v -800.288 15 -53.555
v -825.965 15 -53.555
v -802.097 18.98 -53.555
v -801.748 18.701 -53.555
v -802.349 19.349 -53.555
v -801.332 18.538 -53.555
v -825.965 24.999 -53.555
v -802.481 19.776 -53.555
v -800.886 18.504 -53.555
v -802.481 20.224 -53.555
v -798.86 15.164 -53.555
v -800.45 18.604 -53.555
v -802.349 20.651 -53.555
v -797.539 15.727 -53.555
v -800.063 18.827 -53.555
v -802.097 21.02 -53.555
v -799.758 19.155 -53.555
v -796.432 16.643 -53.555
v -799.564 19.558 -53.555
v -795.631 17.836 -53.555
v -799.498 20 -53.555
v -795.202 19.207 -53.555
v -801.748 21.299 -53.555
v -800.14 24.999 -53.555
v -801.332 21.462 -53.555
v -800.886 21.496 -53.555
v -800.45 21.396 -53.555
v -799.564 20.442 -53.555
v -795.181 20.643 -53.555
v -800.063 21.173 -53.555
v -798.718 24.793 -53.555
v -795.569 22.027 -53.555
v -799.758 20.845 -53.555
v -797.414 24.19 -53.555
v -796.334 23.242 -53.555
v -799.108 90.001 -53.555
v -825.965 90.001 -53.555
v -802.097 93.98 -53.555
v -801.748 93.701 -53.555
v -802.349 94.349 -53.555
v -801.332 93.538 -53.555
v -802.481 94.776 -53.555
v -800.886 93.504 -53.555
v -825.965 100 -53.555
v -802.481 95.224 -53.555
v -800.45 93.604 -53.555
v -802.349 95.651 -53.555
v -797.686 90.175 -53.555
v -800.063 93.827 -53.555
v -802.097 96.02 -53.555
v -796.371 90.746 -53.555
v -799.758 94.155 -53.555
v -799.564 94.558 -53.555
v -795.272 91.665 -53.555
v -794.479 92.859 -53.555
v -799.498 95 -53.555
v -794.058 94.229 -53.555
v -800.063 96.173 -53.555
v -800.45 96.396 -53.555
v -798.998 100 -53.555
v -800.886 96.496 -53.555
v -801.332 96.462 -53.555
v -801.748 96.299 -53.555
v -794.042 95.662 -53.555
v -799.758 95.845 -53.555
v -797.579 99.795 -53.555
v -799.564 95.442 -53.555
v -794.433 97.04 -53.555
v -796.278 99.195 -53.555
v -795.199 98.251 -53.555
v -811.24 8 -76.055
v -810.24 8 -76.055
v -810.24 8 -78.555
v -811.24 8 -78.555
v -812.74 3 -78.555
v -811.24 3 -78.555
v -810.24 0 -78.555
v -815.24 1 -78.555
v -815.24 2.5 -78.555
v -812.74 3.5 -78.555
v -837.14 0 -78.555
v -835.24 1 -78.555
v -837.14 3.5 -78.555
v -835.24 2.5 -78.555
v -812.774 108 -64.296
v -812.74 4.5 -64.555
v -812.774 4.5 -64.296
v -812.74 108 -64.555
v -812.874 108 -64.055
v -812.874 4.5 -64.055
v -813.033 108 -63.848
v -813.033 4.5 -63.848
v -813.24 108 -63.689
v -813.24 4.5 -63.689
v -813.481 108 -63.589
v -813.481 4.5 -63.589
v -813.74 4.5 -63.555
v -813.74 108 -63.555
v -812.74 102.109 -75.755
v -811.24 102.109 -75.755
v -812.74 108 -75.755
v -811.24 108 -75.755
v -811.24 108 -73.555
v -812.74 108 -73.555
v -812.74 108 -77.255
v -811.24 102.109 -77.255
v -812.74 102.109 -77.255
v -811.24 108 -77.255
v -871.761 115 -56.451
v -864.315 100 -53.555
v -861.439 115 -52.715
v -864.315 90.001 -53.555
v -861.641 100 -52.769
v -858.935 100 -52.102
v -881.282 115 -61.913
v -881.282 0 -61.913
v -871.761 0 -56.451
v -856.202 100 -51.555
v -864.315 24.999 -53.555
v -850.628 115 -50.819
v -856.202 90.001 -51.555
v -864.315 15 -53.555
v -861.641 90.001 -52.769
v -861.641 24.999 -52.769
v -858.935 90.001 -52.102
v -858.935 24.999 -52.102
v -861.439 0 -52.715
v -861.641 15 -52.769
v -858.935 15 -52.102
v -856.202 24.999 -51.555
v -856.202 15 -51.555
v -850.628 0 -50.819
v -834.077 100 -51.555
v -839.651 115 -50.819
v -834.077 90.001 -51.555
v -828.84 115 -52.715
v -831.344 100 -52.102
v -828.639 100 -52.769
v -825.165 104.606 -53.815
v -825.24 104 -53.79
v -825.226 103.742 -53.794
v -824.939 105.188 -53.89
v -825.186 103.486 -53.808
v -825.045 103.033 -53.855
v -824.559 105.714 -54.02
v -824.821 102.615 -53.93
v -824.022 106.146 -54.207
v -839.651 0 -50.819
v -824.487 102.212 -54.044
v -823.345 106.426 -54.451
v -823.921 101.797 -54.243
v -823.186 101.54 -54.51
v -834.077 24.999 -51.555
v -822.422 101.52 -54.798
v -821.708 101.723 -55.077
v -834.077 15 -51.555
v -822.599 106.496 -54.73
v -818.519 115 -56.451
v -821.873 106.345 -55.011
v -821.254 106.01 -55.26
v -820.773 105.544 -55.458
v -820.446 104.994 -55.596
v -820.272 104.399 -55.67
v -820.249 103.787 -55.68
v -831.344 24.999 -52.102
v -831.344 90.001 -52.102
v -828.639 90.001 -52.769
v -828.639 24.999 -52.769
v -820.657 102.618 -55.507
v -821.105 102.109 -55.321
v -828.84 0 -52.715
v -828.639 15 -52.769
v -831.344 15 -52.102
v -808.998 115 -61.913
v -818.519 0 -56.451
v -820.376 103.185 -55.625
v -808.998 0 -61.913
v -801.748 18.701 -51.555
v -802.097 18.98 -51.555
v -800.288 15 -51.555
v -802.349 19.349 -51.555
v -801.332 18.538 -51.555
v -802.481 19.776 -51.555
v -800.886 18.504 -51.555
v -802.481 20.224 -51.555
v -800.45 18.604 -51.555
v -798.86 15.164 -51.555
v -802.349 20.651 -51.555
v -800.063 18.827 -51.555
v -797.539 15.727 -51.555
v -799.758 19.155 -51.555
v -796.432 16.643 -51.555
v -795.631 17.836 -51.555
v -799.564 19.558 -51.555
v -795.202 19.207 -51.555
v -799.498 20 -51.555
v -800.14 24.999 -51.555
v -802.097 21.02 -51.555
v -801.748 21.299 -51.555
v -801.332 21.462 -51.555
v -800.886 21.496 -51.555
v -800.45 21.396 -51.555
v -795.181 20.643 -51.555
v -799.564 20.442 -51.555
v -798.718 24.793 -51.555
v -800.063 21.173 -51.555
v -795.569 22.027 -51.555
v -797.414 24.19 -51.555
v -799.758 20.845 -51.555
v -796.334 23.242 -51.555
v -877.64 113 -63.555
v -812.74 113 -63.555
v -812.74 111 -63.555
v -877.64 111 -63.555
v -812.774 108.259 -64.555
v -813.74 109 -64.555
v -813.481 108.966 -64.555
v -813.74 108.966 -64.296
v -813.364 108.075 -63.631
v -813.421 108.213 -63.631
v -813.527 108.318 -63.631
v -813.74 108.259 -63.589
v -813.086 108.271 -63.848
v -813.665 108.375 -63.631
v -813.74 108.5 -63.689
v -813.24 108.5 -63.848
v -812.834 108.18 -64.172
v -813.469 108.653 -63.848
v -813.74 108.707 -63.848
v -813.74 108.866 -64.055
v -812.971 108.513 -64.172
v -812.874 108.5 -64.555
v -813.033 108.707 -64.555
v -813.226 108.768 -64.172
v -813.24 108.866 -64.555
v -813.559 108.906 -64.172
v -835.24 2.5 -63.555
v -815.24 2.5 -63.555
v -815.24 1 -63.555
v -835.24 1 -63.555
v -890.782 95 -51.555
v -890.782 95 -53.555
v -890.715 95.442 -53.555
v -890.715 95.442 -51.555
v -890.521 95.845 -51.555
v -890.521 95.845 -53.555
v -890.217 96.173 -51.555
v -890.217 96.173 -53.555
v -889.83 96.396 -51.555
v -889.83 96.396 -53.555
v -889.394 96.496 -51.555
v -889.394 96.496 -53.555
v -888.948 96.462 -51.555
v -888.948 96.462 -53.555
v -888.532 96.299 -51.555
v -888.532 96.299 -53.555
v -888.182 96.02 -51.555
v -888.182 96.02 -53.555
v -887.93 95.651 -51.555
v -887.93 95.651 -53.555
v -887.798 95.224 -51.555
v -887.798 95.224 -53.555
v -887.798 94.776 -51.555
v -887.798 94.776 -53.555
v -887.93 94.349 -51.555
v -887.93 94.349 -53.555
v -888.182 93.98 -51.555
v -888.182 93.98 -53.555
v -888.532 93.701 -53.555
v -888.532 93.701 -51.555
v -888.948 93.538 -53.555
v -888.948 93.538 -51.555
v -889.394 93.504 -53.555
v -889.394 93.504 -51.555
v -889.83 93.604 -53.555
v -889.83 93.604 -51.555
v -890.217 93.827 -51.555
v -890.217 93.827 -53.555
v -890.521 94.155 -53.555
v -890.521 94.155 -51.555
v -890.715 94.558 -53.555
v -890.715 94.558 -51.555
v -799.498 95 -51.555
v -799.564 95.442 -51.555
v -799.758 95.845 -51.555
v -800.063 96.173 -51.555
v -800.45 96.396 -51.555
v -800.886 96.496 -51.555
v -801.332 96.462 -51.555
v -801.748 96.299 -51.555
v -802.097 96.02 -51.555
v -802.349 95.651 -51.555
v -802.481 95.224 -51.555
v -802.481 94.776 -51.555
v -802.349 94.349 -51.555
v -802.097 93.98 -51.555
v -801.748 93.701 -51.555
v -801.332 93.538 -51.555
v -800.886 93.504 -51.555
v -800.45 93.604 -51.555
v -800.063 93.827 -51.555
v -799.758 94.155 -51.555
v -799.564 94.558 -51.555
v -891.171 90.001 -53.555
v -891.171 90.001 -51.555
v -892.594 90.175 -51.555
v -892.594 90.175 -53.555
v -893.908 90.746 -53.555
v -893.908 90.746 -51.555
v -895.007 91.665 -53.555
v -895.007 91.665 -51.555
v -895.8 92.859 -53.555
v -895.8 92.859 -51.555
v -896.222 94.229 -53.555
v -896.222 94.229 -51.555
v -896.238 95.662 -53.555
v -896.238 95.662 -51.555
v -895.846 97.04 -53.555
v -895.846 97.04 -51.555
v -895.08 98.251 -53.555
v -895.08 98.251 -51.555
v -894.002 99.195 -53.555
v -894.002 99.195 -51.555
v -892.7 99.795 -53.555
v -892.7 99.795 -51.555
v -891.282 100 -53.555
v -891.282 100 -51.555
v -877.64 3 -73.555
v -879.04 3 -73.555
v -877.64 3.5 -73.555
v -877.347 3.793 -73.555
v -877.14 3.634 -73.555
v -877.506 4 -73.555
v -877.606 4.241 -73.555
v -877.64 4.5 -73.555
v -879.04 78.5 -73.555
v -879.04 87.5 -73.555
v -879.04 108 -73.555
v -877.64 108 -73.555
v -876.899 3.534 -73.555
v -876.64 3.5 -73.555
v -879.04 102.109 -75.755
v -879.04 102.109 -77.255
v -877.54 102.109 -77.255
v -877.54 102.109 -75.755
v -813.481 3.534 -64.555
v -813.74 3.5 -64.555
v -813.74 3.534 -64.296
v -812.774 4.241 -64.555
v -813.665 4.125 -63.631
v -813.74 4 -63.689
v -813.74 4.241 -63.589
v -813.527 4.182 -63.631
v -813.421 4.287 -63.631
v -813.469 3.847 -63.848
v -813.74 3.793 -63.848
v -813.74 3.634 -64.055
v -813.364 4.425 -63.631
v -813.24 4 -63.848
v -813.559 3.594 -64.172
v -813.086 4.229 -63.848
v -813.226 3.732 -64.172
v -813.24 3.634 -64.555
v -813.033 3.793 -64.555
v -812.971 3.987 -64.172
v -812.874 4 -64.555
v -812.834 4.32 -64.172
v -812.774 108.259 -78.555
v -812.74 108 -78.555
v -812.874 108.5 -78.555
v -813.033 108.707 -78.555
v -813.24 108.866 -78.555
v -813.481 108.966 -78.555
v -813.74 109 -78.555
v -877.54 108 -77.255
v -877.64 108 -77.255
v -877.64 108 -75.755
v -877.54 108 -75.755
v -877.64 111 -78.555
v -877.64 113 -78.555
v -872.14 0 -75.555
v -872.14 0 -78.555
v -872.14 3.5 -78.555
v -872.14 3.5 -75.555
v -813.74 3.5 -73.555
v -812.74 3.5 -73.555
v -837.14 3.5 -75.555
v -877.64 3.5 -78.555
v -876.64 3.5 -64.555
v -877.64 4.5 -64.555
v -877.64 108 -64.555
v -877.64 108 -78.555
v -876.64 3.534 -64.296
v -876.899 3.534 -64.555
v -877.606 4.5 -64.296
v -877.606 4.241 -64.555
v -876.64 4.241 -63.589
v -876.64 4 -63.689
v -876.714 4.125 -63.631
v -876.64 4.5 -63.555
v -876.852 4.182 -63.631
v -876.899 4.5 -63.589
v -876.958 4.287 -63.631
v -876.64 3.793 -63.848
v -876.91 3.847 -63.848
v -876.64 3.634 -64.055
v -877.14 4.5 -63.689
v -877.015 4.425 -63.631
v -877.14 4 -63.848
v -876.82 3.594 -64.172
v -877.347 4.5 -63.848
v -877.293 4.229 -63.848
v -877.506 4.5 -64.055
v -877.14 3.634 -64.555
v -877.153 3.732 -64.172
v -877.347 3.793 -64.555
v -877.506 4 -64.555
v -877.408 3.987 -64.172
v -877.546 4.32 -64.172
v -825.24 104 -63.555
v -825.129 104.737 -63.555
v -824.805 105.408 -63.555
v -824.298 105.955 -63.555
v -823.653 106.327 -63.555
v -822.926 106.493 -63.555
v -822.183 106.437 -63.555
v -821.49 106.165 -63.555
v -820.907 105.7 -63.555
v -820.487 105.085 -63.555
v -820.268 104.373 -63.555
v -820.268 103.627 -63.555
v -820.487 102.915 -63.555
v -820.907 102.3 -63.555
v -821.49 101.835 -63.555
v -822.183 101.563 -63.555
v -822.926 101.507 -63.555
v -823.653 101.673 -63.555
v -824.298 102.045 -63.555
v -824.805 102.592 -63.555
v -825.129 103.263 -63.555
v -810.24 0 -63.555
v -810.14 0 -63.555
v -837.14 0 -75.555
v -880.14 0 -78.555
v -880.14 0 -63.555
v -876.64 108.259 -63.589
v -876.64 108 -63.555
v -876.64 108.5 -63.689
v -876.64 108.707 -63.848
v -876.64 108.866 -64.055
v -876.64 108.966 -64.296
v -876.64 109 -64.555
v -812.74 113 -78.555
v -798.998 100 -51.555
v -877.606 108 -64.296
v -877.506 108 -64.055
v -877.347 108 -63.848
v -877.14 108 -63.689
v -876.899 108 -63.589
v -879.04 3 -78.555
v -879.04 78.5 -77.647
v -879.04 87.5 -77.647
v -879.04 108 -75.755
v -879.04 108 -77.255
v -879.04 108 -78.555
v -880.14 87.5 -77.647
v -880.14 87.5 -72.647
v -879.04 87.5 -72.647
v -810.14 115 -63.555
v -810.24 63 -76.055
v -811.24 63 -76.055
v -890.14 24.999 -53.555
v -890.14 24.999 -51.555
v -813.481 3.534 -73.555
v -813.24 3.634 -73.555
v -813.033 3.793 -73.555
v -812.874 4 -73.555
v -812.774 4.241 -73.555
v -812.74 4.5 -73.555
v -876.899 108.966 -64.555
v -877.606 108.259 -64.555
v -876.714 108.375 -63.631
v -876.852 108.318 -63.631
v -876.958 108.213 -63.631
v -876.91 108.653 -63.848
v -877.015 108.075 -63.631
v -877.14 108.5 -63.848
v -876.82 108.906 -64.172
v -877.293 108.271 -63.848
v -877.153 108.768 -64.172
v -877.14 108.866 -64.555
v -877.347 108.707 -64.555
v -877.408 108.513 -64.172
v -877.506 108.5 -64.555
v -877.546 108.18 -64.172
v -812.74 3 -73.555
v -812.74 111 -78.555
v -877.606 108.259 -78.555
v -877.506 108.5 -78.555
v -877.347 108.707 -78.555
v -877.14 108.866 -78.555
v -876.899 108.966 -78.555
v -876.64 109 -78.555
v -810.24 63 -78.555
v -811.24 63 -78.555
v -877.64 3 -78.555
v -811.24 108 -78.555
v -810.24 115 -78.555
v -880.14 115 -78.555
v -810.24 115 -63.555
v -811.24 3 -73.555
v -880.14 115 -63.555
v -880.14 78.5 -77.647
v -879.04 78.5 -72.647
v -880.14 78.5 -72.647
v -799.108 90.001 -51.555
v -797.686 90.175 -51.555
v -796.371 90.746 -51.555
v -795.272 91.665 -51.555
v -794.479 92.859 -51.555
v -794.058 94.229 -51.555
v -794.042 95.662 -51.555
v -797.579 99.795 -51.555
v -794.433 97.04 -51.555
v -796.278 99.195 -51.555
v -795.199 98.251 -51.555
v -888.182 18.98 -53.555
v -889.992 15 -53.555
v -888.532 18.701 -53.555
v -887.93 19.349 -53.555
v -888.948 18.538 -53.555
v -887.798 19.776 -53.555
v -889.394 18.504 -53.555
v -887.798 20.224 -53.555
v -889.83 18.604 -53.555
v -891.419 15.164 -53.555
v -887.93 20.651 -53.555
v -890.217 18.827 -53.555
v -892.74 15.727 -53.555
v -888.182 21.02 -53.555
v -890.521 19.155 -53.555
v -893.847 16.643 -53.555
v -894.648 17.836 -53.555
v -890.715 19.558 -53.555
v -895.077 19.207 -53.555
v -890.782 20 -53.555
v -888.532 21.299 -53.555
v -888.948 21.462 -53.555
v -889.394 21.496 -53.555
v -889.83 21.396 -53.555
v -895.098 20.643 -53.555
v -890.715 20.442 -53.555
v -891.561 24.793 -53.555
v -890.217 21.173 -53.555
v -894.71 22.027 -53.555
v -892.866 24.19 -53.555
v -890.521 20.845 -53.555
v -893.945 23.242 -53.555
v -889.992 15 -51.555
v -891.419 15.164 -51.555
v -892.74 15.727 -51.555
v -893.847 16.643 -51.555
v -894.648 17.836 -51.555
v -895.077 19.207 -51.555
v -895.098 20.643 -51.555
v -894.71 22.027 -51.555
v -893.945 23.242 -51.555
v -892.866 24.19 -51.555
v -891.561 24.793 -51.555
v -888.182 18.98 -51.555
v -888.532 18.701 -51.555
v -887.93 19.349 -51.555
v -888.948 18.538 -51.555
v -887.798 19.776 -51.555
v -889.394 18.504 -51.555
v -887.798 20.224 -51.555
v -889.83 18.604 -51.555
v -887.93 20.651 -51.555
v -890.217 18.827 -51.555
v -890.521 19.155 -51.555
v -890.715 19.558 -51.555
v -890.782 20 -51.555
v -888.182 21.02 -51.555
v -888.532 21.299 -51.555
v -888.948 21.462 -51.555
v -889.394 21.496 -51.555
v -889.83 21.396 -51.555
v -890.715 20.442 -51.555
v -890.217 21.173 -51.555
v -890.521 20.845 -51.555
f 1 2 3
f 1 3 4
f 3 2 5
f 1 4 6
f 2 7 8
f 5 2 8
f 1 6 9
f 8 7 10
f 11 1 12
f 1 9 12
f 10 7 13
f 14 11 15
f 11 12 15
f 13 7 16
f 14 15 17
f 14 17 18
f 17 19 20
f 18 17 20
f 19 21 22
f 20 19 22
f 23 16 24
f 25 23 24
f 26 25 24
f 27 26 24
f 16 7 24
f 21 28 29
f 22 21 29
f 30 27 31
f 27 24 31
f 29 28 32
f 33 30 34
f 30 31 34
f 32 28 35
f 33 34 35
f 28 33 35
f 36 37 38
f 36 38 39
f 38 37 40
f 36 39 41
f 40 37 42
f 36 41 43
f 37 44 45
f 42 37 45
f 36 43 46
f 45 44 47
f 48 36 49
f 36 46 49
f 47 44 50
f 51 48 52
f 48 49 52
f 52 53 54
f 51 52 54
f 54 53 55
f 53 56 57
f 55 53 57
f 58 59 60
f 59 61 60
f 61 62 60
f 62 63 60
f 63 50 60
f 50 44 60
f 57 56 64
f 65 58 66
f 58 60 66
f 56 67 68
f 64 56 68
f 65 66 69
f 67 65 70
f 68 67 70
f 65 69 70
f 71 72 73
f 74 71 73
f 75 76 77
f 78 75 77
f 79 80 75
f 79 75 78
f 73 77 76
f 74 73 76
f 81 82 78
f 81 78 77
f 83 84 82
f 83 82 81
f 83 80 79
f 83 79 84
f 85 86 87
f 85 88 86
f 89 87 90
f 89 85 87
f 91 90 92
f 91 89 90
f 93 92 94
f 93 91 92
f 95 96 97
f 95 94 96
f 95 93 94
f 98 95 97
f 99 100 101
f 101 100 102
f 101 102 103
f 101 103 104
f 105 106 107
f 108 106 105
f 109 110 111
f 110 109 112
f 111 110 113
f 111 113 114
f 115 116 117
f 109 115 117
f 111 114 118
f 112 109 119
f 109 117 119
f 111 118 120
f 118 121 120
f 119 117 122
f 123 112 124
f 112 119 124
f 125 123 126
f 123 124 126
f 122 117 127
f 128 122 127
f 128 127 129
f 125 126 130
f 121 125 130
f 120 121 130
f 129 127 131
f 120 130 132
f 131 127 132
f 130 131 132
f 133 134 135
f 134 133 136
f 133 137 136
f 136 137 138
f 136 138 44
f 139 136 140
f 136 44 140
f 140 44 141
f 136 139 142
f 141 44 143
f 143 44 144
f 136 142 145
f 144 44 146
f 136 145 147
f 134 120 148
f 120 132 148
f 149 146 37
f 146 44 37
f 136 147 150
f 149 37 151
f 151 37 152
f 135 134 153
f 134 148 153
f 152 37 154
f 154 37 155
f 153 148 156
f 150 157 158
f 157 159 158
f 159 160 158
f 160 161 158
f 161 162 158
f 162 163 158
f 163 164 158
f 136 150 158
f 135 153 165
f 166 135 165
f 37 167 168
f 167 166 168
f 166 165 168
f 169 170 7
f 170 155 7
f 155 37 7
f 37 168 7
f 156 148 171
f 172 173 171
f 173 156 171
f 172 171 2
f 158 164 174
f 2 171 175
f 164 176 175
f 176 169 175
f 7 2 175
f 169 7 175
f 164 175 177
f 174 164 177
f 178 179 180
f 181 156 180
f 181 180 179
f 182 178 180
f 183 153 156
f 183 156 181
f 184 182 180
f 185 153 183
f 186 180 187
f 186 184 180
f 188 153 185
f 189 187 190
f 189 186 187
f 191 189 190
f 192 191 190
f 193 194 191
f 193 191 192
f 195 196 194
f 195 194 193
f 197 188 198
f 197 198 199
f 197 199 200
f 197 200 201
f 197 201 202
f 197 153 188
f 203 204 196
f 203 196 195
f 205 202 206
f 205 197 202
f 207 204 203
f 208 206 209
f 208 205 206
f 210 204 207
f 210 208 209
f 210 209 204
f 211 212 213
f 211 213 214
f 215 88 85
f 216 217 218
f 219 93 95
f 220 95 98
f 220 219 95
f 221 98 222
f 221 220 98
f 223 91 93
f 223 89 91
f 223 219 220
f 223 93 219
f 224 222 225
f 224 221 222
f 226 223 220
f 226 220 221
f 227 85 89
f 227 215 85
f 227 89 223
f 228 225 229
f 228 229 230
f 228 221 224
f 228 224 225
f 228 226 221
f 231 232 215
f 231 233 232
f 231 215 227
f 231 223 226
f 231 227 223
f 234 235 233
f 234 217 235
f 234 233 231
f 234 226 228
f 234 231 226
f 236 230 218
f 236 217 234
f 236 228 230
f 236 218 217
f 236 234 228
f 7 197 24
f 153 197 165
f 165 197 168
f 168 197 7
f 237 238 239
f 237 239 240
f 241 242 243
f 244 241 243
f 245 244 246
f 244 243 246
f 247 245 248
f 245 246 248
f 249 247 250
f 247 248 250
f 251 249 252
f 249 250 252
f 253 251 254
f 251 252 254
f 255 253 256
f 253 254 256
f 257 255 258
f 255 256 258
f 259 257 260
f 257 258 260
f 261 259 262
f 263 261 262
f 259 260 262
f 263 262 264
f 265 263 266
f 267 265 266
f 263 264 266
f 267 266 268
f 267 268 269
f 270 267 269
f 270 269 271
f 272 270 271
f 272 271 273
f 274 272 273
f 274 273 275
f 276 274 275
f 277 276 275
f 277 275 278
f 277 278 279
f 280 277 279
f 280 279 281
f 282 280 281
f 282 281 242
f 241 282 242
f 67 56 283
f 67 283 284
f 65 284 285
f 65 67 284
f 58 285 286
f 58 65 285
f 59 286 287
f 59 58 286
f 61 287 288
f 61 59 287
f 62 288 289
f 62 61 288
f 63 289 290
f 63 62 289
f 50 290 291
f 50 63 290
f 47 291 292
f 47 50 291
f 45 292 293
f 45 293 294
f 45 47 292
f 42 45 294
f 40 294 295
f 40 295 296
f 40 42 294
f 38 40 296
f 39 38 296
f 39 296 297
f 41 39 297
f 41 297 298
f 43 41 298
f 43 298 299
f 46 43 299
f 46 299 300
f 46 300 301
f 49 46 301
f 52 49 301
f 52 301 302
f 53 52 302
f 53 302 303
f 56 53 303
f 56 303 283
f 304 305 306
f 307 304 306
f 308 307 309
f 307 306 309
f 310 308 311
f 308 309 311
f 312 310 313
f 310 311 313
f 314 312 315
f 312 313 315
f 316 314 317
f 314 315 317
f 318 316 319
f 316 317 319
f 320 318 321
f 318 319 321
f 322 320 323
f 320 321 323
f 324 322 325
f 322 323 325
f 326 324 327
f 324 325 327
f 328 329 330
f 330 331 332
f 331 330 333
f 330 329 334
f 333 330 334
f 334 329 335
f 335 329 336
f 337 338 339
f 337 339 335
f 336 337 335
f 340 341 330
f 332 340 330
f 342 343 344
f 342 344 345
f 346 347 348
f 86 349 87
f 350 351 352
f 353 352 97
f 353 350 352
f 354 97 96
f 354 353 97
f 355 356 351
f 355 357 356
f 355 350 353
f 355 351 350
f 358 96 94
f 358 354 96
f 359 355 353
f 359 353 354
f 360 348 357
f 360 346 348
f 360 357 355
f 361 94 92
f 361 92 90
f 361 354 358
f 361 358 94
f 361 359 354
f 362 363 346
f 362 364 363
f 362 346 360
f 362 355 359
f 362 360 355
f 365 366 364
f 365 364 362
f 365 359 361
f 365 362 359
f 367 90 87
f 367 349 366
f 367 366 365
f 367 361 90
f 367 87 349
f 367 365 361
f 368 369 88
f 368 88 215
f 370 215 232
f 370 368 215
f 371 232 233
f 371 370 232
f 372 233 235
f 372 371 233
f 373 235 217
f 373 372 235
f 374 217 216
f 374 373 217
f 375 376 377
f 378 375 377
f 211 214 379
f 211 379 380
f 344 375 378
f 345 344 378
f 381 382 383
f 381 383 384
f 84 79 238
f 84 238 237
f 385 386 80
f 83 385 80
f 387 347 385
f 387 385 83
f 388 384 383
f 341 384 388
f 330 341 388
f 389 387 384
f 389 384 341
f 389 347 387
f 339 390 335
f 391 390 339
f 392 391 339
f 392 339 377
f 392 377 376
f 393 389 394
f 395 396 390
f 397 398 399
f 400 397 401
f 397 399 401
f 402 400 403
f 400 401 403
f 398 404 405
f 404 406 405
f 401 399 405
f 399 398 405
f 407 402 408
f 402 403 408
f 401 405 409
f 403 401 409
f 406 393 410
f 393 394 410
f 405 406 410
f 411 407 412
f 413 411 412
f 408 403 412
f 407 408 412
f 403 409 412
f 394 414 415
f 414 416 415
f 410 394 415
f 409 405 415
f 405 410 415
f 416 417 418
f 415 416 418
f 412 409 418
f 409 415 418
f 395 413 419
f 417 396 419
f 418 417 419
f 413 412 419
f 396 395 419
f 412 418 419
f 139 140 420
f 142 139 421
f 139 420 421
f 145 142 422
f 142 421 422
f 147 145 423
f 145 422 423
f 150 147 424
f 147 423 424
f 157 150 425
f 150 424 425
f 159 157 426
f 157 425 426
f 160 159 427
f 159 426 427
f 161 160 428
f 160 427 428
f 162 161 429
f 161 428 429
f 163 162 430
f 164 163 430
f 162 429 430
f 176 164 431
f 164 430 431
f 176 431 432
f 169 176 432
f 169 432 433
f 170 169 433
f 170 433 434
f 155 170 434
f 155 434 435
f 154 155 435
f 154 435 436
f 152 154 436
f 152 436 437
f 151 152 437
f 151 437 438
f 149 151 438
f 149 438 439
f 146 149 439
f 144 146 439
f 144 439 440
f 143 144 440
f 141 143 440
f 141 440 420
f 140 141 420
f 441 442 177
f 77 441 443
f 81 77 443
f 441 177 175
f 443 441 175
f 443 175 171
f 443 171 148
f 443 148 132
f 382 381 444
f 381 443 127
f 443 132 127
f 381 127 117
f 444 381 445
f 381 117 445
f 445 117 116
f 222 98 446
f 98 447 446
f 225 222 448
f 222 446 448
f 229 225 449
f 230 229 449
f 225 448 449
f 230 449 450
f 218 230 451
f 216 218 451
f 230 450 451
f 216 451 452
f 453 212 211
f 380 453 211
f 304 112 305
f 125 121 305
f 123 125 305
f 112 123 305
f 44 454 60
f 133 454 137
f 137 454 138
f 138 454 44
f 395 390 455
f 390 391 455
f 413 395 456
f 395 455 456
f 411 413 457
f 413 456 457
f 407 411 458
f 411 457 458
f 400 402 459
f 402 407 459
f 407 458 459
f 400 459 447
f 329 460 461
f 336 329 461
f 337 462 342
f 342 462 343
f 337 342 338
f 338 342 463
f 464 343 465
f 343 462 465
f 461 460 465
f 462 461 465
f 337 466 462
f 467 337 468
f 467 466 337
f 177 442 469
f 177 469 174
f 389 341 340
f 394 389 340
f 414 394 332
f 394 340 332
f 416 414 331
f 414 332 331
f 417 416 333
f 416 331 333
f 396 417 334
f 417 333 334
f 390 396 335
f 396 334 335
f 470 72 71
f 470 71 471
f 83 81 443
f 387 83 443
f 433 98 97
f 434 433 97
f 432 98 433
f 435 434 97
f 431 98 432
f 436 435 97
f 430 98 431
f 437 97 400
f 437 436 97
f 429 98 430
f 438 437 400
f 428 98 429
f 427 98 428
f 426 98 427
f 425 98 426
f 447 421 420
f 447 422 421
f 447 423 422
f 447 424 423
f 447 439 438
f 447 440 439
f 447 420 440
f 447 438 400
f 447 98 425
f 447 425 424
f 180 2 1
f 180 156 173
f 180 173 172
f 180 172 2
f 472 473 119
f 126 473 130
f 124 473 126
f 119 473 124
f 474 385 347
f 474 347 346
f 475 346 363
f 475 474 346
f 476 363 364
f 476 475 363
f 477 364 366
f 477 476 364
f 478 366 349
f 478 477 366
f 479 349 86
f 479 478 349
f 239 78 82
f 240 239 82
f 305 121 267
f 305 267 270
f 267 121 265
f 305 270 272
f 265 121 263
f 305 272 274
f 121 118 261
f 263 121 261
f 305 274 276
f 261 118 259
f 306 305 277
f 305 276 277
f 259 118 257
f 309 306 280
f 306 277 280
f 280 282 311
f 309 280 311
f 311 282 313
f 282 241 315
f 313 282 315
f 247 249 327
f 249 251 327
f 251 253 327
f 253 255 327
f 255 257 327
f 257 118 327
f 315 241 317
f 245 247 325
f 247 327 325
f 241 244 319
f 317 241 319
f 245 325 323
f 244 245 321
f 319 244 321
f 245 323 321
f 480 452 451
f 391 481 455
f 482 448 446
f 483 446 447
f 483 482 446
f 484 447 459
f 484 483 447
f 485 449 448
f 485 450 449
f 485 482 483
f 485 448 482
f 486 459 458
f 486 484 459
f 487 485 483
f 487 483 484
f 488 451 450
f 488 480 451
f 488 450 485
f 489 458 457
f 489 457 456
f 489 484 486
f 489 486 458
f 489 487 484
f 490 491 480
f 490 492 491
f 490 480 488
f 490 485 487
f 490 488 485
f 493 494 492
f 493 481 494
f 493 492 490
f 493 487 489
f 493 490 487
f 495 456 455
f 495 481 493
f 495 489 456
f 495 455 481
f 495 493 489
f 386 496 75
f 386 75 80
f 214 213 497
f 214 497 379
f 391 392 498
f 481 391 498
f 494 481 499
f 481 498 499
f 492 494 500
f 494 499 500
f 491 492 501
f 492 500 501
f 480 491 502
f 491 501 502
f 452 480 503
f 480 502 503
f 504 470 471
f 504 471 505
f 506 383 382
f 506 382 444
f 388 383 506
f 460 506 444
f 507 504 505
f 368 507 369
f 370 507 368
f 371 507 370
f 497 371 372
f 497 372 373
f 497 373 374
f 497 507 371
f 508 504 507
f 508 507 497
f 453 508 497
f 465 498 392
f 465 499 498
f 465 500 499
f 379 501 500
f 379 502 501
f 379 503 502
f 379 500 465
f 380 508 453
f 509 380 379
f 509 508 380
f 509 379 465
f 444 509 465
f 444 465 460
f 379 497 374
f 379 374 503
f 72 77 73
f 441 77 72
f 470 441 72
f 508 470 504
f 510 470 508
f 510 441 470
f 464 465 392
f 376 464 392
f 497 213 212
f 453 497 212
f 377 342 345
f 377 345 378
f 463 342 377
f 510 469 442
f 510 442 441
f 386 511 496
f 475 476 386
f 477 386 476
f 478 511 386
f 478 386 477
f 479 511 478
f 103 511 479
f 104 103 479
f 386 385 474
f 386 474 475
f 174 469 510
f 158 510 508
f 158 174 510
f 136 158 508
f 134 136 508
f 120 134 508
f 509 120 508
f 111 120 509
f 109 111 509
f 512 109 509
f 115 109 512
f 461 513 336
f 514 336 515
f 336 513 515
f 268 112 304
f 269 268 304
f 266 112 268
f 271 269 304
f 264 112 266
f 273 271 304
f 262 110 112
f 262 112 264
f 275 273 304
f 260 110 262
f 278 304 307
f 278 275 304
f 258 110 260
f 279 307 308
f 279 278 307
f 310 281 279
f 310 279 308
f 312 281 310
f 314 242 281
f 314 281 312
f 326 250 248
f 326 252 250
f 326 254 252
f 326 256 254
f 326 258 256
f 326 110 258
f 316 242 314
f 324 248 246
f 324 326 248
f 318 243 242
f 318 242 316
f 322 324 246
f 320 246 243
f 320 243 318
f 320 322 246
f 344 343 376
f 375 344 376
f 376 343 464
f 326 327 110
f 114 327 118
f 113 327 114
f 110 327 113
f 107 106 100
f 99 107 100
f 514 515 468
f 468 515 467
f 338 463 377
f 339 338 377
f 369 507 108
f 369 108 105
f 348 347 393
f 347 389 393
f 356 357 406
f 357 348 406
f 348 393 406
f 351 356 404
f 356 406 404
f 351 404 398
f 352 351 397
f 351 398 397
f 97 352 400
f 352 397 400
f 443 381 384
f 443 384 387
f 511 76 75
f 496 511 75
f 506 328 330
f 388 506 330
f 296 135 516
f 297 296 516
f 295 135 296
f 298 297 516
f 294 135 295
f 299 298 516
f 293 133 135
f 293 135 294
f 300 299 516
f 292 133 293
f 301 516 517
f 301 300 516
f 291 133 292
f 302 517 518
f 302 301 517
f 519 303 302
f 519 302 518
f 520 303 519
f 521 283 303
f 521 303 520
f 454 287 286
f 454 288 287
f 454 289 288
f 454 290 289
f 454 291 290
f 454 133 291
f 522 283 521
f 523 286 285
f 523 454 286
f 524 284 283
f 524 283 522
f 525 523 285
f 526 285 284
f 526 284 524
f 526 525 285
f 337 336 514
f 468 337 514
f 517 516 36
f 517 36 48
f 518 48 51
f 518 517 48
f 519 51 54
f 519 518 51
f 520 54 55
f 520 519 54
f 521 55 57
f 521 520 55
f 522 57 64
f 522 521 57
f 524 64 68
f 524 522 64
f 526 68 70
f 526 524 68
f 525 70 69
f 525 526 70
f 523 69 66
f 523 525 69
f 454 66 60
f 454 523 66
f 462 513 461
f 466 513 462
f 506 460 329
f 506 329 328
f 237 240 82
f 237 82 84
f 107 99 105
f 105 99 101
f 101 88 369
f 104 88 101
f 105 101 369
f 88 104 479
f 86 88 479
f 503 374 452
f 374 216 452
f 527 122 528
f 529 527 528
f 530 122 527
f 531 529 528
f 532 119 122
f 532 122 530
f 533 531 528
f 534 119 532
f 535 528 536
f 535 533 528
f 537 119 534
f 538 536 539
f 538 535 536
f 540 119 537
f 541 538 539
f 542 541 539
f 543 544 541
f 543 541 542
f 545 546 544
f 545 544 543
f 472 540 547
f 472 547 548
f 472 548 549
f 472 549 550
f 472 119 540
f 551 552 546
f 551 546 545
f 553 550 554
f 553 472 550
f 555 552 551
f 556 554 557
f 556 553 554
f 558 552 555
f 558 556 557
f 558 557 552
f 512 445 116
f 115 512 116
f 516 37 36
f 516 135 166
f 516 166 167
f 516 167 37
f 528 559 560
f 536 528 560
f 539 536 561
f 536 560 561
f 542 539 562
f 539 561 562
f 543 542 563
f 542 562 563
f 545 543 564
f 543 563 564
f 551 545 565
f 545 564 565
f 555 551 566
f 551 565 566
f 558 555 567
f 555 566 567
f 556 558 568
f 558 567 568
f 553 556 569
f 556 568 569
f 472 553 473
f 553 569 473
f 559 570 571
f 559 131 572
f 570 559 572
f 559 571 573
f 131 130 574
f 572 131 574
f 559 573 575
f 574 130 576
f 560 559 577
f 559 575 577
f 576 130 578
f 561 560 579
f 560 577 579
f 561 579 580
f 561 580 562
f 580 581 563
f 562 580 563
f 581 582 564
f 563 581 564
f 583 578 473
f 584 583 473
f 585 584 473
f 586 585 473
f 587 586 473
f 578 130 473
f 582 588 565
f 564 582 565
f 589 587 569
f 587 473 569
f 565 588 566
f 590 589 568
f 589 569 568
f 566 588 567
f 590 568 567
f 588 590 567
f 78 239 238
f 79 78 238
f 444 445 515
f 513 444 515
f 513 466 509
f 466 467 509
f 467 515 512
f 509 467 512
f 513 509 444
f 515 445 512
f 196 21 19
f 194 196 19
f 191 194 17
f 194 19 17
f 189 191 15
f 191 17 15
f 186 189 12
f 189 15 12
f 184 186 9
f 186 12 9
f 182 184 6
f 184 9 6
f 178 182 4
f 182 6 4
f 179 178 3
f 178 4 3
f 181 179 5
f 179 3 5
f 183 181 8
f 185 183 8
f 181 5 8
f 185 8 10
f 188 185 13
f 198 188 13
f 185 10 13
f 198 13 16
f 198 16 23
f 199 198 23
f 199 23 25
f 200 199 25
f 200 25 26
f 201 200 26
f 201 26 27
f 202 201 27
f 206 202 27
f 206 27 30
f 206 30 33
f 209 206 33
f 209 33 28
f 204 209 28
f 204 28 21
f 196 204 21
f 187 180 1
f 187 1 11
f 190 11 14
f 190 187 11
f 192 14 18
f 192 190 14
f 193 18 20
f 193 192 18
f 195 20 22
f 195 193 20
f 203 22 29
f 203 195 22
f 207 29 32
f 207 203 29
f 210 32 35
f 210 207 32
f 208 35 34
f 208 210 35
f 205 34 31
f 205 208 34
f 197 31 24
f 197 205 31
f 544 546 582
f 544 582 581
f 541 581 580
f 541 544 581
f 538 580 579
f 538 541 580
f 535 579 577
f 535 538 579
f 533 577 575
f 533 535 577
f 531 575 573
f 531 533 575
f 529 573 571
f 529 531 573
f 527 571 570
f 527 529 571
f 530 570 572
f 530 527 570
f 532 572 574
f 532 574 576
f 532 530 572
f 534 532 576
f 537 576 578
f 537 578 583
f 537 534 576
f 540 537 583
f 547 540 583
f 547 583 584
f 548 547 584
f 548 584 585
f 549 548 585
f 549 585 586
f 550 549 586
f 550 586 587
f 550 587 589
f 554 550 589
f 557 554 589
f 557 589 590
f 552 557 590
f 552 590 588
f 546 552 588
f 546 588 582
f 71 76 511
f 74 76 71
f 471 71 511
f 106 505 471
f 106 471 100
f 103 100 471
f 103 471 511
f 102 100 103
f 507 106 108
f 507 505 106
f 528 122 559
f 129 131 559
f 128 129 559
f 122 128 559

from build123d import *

# Parameters (mm, degrees)
SURFACE_EXTRUDE2_1_DEPTH = 115
THICKEN3_T2              = 2
BOSS_EXTRUDE2_REACH      = 890.848
SKETCH11_W               = 70
SKETCH11_H               = 115
BOSS_EXTRUDE7_DEPTH      = 2
SKETCH17_W               = 2.5
SKETCH17_H               = 115
BOSS_EXTRUDE8_DEPTH      = 15
SKETCH22_W               = 1.5
SKETCH22_H               = 105
CUT_EXTRUDE1_DEPTH       = 5
SKETCH23_W               = 64.9
SKETCH23_H               = 2
BOSS_EXTRUDE9_DEPTH      = 15
SKETCH25_W               = 64.9
SKETCH25_H               = 3.5
BOSS_EXTRUDE10_DEPTH     = 15
SKETCH26_W               = 20
SKETCH26_H               = 1.5
CUT_EXTRUDE3_DEPTH       = 15
SKETCH27_W               = 5
SKETCH27_H               = 9
CUT_EXTRUDE4_DEPTH       = 1.1
SKETCH29_W               = 2.5
SKETCH29_H               = 55
CUT_EXTRUDE6_DEPTH       = 1
CUT_EXTRUDE7_REACH       = 905.754
CUT_EXTRUDE7_END_RADIUS  = 63.3
SKETCH30_R               = 2.5
FILLET1_R                = 1
CUT_EXTRUDE8_REACH       = 909.037
SKETCH31_W               = 35
SKETCH31_H               = 3
CUT_EXTRUDE9_REACH       = 905.975
SKETCH32_R               = 1.5
SKETCH33_W               = 1.5
SKETCH33_H               = 5.890969975
BOSS_EXTRUDE11_DEPTH     = 1.5
MIRROR24_COPY_1_REACH    = 905.975
MIRROR24_COPY_1_SKETCH_R = 1.5


with BuildPart() as body_1:
    # Surface-Extrude2: a surface, the sketch's curves swept straight by 115 mm
    with BuildLine(Plane(origin=(0, 0, 0), x_dir=(1, 0, 0), z_dir=(0, 1, 0)), mode=Mode.PRIVATE) as surface_extrude2_1_path:
        ThreePointArc((-880.139667207, 63.554736355), (-845.139667207, 52.580574649), (-810.139667207, 63.554736355))
    surface_extrude2_1 = Shell.extrude(surface_extrude2_1_path.wire(), (0 * SURFACE_EXTRUDE2_1_DEPTH, 1 * SURFACE_EXTRUDE2_1_DEPTH, 0 * SURFACE_EXTRUDE2_1_DEPTH))
    add(Solid.thicken(surface_extrude2_1, -THICKEN3_T2))

    # Sketch11 → Boss-Extrude2 (add, up to next)
    with BuildSketch(Plane(origin=(0, 0, -63.554736355), x_dir=(-1, 0, 0), z_dir=(0, 0, -1)), mode=Mode.PRIVATE) as boss_extrude2_sk1:
        with Locations((845.139667207, 57.5)):
            Rectangle(SKETCH11_W, SKETCH11_H)
    boss_extrude2_tool1 = extrude(boss_extrude2_sk1.sketch, amount=-BOSS_EXTRUDE2_REACH, mode=Mode.PRIVATE) - body_1.part
    add(boss_extrude2_tool1.solids().sort_by_distance((-845.139667, 57.5, -63.554736))[0])

    # Sketch15 → Boss-Extrude7 (add)
    with BuildSketch(Plane(origin=(0, 0, -51.554736355), x_dir=(-1, 0, 0), z_dir=(0, 0, -1))):
        with BuildLine():
            Line((890.139667207, 24.998904399), (845.139667207, 24.998904399))
            Line((845.139667207, 24.998904399), (845.139667207, 15))
            Line((845.139667207, 15), (889.991644173, 15))
            ThreePointArc((889.991644173, 15), (895.139667207, 19.924336912), (890.139667207, 24.998904399))
        make_face()
        with BuildLine():
            Line((891.281592166, 100), (845.139667207, 100))
            Line((845.139667207, 100), (845.139667207, 90.00121851))
            Line((845.139667207, 90.00121851), (891.171212738, 90.00121851))
            ThreePointArc((891.171212738, 90.00121851), (896.281287529, 94.944806923), (891.281592166, 100))
        make_face()
    boss_extrude7 = extrude(amount=BOSS_EXTRUDE7_DEPTH)

    # Mirror20: Boss-Extrude7 across plane
    add(boss_extrude7.mirror(Plane.ZY.offset(845.139667207)))

    # Sketch17 → Boss-Extrude8 (add)
    with BuildSketch(Plane(origin=(0, 0, -63.554736355), x_dir=(-1, 0, 0), z_dir=(0, 0, -1))):
        with Locations((878.889667207, 57.5)):
            Rectangle(SKETCH17_W, SKETCH17_H)
        with Locations((811.489667207, 57.5)):
            Rectangle(SKETCH17_W, SKETCH17_H)
    extrude(amount=BOSS_EXTRUDE8_DEPTH)

    # Sketch22 → Cut-Extrude1 (cut)
    with BuildSketch(Plane(origin=(0, 0, -78.554736355), x_dir=(-1, 0, 0), z_dir=(0, 0, -1))):
        with Locations((811.989667207, 55.5)):
            Rectangle(SKETCH22_W, SKETCH22_H)
    cut_extrude1 = extrude(amount=-CUT_EXTRUDE1_DEPTH, mode=Mode.SUBTRACT)

    # Mirror21: Cut-Extrude1 across plane
    add(cut_extrude1.mirror(Plane.ZY.offset(845.139667207)), mode=Mode.SUBTRACT)

    # Sketch23 → Boss-Extrude9 (add)
    with BuildSketch(Plane(origin=(0, 0, -63.554736355), x_dir=(-1, 0, 0), z_dir=(0, 0, -1))):
        with Locations((845.189667207, 114)):
            Rectangle(SKETCH23_W, SKETCH23_H)
        with Locations((845.189667207, 110)):
            Rectangle(SKETCH23_W, SKETCH23_H)
    extrude(amount=BOSS_EXTRUDE9_DEPTH)

    # Sketch25 → Boss-Extrude10 (add)
    with BuildSketch(Plane(origin=(0, 0, -63.554736355), x_dir=(-1, 0, 0), z_dir=(0, 0, -1))):
        with Locations((845.189667207, 1.75)):
            Rectangle(SKETCH25_W, SKETCH25_H)
    extrude(amount=BOSS_EXTRUDE10_DEPTH)

    # Sketch26 → Cut-Extrude3 (cut)
    with BuildSketch(Plane(origin=(0, 0, -78.554736355), x_dir=(-1, 0, 0), z_dir=(0, 0, -1))):
        with Locations((825.239667207, 1.75)):
            Rectangle(SKETCH26_W, SKETCH26_H)
    extrude(amount=-CUT_EXTRUDE3_DEPTH, mode=Mode.SUBTRACT)

    # Sketch27 → Cut-Extrude4 (cut)
    with BuildSketch(Plane.ZY.offset(880.139667207)):
        with Locations((-75.146974965, 83)):
            Rectangle(SKETCH27_W, SKETCH27_H)
    extrude(amount=-CUT_EXTRUDE4_DEPTH, mode=Mode.SUBTRACT)

    # Sketch29 → Cut-Extrude6 (cut)
    with BuildSketch(Plane(origin=(-810.239667207, 0, 0), x_dir=(0, 0, -1), z_dir=(1, 0, 0))):
        with Locations((77.304736355, 35.5)):
            Rectangle(SKETCH29_W, SKETCH29_H)
    extrude(amount=-CUT_EXTRUDE6_DEPTH, mode=Mode.SUBTRACT)

    # Cut-Extrude7: up to this cylinder (the profile starts inside it)
    cut_extrude7_end = Plane(origin=(-845.139667207, 104, -113.880574649), z_dir=(0, 1, 0)) * Cylinder(CUT_EXTRUDE7_END_RADIUS, 1939.108, mode=Mode.PRIVATE)
    # Sketch30 → Cut-Extrude7 (cut, up to the surface)
    with BuildSketch(Plane(origin=(0, 0, -63.554736355), x_dir=(-1, 0, 0), z_dir=(0, 0, -1)), mode=Mode.PRIVATE) as cut_extrude7_sk1:
        with Locations((822.739667207, 104)):
            Circle(SKETCH30_R)
    cut_extrude7_tool1 = extrude(cut_extrude7_sk1.sketch, amount=-CUT_EXTRUDE7_REACH, mode=Mode.PRIVATE) & cut_extrude7_end
    add(cut_extrude7_tool1.solids().sort_by_distance((-822.739667, 104, -63.554736))[0], mode=Mode.SUBTRACT)

    # Fillet1
    fillet1_edges = [body_1.edges().sort_by_distance(p)[0] for p in [
        (-812.739667207, 3.5, -68.554736355),
        (-812.739667207, 109, -71.054736355),
        (-877.639667207, 109, -71.054736355),
        (-877.639667207, 3.5, -68.554736355),
        (-845.189667207, 3.5, -63.554736355),
        (-812.739667207, 56.25, -63.554736355),
        (-845.189667207, 109, -63.554736355),
        (-877.639667207, 56.25, -63.554736355),
    ]]
    fillet(fillet1_edges, radius=FILLET1_R - 0.0001)  # a hair under: the kernel refuses the full size

    # Sketch31 → Cut-Extrude8 (cut, up to next)
    with BuildSketch(Plane.XZ, mode=Mode.PRIVATE) as cut_extrude8_sk1:
        with Locations((-854.639667207, -77.054736355)):
            Rectangle(SKETCH31_W, SKETCH31_H)
    cut_extrude8_tool1 = extrude(cut_extrude8_sk1.sketch, amount=-CUT_EXTRUDE8_REACH, mode=Mode.PRIVATE) & body_1.part
    add(cut_extrude8_tool1.solids().sort_by_distance((-854.639667, 0, -77.054736))[0], mode=Mode.SUBTRACT)

    # Sketch32 → Cut-Extrude9 (cut, up to next)
    with BuildSketch(Plane(origin=(0, 0, -53.554736355), x_dir=(-1, 0, 0), z_dir=(0, 0, -1)), mode=Mode.PRIVATE) as cut_extrude9_sk1:
        with Locations((889.281592166, 95)):
            Circle(SKETCH32_R)
    cut_extrude9_tool1 = extrude(cut_extrude9_sk1.sketch, amount=-CUT_EXTRUDE9_REACH, mode=Mode.PRIVATE) & body_1.part
    cut_extrude9 = cut_extrude9_tool1.solids().sort_by_distance((-889.281592, 95, -53.554736))[0]
    add(cut_extrude9, mode=Mode.SUBTRACT)

    # Sketch33 → Boss-Extrude11 (add)
    with BuildSketch(Plane.ZY.offset(811.239667207)):
        with Locations((-76.504736355, 105.054515013)):
            Rectangle(SKETCH33_W, SKETCH33_H)
    boss_extrude11 = extrude(amount=BOSS_EXTRUDE11_DEPTH)

    # Mirror22: Boss-Extrude11 across plane
    add(boss_extrude11.mirror(Plane.ZY.offset(845.139667207)))

    # Mirror23: Cut-Extrude9 across plane
    add(cut_extrude9.mirror(Plane.ZY.offset(845.139667207)), mode=Mode.SUBTRACT)

    # Mirror24: Cut-Extrude9 across plane
    add(cut_extrude9.mirror(Plane.ZX.offset(57.5)), mode=Mode.SUBTRACT)

    # Mirror24 copy 1 sketch → Mirror24 copy 1 (cut, up to next)
    with BuildSketch(Plane(origin=(-1690.279334414, 115, -53.554736355), x_dir=(1, 0, 0), z_dir=(0, 0, -1)), mode=Mode.PRIVATE) as mirror24_copy_1_sk1:
        with Locations((889.281592166, 95)):
            Circle(MIRROR24_COPY_1_SKETCH_R)
    mirror24_copy_1_tool1 = extrude(mirror24_copy_1_sk1.sketch, amount=-MIRROR24_COPY_1_REACH, mode=Mode.PRIVATE) & body_1.part
    add(mirror24_copy_1_tool1.solids().sort_by_distance((-800.997742414, 20, -53.554736))[0], mode=Mode.SUBTRACT)


solid = body_1.part
